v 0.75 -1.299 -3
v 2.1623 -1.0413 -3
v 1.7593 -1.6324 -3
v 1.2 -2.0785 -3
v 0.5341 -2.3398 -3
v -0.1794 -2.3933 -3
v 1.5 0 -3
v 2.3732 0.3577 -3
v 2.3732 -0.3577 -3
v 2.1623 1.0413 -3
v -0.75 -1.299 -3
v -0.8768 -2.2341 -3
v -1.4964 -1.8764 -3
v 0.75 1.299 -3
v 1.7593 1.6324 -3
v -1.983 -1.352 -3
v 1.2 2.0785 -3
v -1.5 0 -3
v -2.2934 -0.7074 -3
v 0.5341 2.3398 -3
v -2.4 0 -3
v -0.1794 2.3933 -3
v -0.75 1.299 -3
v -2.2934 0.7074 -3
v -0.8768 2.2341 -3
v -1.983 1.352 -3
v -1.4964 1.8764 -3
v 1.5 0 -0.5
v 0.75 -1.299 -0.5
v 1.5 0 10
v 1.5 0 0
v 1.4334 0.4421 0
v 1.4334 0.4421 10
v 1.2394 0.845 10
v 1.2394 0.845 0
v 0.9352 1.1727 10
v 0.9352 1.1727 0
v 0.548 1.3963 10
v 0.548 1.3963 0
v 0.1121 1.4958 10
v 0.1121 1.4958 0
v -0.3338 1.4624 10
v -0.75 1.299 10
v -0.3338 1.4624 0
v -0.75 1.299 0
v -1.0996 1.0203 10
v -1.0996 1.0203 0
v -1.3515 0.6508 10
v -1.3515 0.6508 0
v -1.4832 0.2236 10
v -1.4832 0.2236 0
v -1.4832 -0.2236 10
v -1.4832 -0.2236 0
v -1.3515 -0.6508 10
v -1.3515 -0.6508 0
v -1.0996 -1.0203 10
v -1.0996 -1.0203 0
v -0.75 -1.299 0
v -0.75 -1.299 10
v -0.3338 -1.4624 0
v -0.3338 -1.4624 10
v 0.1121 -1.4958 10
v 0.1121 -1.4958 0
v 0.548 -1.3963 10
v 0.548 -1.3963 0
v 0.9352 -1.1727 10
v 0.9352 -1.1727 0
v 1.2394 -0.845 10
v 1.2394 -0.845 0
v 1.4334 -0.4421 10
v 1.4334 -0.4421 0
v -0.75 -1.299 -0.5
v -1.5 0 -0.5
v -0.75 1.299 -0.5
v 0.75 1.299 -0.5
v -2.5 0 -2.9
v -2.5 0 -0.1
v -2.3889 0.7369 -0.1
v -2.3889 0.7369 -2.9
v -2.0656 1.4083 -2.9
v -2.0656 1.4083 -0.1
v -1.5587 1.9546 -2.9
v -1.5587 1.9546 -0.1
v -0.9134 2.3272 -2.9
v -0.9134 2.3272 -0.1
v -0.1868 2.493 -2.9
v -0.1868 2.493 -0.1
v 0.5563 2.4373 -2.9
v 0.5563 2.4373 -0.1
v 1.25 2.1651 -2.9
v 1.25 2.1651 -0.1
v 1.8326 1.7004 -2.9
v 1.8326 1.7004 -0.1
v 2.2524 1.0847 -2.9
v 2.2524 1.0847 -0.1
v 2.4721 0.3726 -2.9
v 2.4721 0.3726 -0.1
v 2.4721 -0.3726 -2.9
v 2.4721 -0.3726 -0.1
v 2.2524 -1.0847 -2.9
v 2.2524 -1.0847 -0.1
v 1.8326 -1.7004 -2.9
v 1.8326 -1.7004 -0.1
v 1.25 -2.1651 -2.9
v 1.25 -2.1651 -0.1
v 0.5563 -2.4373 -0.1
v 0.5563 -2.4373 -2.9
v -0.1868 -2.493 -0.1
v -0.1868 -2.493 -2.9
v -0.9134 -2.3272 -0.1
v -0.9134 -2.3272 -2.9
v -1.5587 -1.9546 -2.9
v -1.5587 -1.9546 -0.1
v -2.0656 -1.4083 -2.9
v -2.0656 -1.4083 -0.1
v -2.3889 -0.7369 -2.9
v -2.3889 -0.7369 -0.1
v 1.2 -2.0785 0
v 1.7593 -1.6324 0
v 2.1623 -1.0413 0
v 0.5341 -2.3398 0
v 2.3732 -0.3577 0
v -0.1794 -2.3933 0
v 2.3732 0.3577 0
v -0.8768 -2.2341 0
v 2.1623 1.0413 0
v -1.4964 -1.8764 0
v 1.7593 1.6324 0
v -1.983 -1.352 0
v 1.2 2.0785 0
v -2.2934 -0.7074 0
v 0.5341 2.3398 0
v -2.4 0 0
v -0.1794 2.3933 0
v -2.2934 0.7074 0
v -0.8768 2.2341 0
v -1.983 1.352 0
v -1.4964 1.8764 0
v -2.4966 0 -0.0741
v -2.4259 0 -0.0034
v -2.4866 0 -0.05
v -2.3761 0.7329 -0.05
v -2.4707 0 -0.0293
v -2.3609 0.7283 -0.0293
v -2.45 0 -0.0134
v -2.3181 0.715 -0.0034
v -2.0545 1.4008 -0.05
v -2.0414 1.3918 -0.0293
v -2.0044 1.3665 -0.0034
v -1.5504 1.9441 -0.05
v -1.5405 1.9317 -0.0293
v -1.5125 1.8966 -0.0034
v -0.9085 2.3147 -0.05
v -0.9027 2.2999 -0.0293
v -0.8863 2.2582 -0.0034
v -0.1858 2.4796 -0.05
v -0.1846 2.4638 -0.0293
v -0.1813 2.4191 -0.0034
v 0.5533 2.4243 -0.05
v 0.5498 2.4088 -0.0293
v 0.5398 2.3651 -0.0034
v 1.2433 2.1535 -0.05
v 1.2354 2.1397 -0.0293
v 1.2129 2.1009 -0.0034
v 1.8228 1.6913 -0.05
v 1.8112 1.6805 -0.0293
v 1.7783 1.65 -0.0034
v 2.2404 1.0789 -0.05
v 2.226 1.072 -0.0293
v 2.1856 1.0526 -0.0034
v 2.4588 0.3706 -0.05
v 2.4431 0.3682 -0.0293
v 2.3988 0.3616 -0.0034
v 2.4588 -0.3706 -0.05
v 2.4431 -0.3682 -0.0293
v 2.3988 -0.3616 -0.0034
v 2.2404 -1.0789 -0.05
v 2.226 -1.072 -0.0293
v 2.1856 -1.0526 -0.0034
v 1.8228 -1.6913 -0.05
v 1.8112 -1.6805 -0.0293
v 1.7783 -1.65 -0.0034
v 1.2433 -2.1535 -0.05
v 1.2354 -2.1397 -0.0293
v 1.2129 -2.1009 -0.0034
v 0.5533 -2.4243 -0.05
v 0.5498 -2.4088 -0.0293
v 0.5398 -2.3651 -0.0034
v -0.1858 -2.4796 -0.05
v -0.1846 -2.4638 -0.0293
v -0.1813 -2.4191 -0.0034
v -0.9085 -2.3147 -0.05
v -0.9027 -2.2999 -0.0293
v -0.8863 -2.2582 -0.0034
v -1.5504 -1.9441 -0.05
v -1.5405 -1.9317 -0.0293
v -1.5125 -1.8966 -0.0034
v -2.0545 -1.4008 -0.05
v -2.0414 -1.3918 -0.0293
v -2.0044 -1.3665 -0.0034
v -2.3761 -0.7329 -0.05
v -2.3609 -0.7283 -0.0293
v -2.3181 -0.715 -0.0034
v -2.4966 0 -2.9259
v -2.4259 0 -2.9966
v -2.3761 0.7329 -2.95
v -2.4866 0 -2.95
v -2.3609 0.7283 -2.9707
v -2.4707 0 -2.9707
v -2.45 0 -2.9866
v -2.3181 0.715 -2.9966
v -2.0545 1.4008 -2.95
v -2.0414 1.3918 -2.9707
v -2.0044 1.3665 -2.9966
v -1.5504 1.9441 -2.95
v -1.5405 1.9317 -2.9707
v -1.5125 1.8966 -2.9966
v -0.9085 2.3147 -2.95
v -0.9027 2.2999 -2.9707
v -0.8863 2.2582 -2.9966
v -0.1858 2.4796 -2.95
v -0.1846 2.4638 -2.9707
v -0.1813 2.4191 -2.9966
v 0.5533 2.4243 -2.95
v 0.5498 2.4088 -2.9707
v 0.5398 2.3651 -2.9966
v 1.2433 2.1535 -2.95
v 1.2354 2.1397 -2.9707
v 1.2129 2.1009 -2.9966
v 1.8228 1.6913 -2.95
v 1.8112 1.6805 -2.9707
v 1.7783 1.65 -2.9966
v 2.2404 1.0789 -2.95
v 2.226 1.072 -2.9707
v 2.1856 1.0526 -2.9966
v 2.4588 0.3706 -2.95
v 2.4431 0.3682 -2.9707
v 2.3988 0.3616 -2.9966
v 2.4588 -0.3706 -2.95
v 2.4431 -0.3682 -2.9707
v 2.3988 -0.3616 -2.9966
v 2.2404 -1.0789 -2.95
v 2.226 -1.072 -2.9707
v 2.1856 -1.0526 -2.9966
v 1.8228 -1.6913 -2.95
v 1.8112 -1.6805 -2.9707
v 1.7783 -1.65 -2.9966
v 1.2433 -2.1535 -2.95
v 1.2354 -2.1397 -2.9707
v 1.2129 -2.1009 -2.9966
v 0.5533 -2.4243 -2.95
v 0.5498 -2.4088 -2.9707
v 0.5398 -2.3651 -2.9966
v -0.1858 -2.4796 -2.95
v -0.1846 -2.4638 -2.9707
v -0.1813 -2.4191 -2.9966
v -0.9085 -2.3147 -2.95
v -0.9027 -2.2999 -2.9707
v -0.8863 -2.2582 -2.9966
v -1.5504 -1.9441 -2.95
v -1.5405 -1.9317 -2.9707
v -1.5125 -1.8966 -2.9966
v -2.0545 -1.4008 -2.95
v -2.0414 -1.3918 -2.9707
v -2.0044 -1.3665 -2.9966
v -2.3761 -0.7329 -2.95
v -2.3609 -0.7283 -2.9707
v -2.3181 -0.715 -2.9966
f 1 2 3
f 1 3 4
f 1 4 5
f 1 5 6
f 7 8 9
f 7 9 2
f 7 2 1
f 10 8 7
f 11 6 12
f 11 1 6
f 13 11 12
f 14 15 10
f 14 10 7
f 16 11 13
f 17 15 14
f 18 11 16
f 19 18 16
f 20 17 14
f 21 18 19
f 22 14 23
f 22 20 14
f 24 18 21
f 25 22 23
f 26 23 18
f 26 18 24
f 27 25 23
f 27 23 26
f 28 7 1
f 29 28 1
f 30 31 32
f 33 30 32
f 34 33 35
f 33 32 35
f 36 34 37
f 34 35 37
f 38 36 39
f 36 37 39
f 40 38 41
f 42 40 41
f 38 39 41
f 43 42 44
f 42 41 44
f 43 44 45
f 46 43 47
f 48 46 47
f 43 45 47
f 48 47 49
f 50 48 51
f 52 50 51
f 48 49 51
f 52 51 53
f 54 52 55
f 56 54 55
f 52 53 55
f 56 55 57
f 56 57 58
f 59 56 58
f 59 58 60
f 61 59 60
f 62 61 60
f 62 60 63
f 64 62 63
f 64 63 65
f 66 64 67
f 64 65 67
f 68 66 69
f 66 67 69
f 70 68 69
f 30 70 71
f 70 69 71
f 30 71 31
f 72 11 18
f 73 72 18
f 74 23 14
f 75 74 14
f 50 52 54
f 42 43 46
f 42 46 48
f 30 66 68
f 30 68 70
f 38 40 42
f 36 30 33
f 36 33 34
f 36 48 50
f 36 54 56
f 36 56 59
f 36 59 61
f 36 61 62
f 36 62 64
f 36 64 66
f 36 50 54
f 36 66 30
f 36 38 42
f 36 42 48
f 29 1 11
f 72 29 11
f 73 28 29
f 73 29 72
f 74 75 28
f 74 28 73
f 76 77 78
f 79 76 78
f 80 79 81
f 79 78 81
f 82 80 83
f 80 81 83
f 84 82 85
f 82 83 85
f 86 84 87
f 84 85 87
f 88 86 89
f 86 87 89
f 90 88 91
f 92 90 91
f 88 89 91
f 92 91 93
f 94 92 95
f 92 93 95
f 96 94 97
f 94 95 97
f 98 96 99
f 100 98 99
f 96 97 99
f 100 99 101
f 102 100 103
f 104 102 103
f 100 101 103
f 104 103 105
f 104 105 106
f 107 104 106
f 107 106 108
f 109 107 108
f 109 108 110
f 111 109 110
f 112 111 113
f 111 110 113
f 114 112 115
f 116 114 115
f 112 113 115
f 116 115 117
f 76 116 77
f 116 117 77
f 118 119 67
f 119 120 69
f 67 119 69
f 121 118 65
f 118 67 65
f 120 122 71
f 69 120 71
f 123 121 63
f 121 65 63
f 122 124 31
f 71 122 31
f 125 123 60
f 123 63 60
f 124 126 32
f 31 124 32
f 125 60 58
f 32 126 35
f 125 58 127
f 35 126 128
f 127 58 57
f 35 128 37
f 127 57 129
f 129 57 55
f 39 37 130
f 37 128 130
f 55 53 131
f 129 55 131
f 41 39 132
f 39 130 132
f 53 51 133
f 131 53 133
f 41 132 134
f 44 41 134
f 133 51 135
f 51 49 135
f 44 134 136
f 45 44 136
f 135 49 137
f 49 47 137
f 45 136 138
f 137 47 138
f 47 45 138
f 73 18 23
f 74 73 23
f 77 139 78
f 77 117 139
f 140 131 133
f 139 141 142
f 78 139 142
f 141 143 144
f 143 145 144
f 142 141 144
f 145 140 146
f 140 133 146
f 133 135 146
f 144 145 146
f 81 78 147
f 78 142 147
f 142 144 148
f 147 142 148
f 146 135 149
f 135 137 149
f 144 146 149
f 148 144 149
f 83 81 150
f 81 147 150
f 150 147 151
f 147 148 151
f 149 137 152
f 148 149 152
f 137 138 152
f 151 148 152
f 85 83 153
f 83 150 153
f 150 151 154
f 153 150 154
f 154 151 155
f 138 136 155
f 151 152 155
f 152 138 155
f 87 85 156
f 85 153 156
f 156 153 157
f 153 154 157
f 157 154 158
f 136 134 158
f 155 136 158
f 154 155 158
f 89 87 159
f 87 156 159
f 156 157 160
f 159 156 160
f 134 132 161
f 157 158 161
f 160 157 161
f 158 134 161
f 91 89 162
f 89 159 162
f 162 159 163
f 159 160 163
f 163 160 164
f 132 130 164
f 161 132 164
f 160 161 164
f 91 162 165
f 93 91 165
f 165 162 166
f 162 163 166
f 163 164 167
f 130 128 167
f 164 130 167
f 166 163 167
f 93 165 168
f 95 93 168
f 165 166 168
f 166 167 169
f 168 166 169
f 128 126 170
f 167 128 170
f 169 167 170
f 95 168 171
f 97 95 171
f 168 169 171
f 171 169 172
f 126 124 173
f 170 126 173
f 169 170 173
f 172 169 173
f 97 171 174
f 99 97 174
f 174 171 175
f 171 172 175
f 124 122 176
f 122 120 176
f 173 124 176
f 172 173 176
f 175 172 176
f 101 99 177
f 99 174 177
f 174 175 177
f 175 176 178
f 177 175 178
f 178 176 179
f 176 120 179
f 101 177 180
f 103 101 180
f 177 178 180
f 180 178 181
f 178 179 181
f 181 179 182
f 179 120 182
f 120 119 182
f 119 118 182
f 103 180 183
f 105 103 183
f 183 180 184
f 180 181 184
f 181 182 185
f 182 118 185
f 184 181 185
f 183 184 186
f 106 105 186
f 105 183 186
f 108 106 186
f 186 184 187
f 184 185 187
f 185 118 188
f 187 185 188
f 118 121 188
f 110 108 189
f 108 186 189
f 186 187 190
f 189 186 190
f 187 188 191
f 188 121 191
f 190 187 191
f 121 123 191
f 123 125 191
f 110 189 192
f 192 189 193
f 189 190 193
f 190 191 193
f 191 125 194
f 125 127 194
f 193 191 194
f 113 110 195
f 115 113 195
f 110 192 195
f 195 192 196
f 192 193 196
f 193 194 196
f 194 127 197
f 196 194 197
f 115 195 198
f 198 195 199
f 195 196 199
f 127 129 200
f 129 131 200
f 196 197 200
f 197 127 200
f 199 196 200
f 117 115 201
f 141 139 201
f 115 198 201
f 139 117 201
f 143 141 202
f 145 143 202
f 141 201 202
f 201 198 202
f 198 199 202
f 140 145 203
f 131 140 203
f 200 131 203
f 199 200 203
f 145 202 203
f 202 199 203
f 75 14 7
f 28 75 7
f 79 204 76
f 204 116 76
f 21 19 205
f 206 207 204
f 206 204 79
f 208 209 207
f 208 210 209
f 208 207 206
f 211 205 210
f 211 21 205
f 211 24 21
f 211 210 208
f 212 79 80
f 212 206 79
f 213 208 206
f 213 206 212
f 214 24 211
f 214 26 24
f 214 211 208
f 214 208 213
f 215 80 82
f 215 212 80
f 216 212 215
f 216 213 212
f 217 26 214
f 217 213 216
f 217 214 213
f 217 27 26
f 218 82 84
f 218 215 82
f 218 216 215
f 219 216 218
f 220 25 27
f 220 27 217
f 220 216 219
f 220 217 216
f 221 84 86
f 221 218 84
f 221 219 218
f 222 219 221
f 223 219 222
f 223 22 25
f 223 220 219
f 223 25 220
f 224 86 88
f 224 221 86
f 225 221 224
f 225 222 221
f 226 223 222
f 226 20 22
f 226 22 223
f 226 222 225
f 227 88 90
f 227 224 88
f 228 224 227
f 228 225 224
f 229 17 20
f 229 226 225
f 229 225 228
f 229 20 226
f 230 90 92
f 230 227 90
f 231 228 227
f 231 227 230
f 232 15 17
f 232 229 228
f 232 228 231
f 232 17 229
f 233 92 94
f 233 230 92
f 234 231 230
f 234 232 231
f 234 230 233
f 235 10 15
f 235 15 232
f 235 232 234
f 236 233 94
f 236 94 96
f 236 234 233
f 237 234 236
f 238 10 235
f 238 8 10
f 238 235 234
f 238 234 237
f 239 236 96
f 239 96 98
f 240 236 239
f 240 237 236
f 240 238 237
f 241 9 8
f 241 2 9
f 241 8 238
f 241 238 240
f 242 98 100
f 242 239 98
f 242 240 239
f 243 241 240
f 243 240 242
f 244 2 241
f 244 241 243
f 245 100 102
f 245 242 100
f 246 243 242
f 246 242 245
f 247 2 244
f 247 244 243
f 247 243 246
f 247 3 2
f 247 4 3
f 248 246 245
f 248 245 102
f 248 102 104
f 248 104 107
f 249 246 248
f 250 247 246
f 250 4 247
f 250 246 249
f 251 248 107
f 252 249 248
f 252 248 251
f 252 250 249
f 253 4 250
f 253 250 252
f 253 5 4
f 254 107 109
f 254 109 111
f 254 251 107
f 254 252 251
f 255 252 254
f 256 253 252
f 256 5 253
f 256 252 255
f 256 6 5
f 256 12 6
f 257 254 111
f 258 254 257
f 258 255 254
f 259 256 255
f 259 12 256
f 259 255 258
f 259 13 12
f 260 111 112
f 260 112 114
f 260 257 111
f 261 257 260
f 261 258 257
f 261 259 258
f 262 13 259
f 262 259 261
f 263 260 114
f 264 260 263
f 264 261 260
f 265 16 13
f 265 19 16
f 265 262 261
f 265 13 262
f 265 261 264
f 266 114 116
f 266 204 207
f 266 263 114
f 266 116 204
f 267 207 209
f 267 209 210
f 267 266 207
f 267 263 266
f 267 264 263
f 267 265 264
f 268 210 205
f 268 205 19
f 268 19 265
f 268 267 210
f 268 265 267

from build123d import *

# Parameters (mm, degrees)
CROQUIS1_R              = 1.5
SALIENTE_EXTRUIR1_DEPTH = 10
CROQUIS3_R              = 2.5
SALIENTE_EXTRUIR3_DEPTH = 3
CORTAR_EXTRUIR1_DEPTH   = 2.5
REDONDEO4_R             = 0.1
REDONDEO5_R             = 0.1


with BuildPart() as part:
    # Croquis1 → Saliente-Extruir1 (new body)
    with BuildSketch(Plane.XY):
        Circle(CROQUIS1_R)
    extrude(amount=SALIENTE_EXTRUIR1_DEPTH)

    # Croquis3 → Saliente-Extruir3 (add)
    with BuildSketch(Plane(origin=(0, 0, 0), x_dir=(-1, 0, 0), z_dir=(0, 0, -1))):
        Circle(CROQUIS3_R)
    extrude(amount=SALIENTE_EXTRUIR3_DEPTH)

    # Croquis4 → Cortar-Extruir1 (cut)
    with BuildSketch(Plane(origin=(0, 0, -3), x_dir=(-1, 0, 0), z_dir=(0, 0, -1))):
        Polygon((1.5, 0), (0.75, 1.299038106), (-0.75, 1.299038106), (-1.5, 0), (-0.75, -1.299038106), (0.75, -1.299038106), align=None)
    extrude(amount=-CORTAR_EXTRUIR1_DEPTH, mode=Mode.SUBTRACT)

    # Redondeo4
    redondeo4_edges = [part.edges().sort_by_distance(p)[0] for p in [
        (2.5, 0, -3),
    ]]
    fillet(redondeo4_edges, radius=REDONDEO4_R)

    # Redondeo5
    redondeo5_edges = [part.edges().sort_by_distance(p)[0] for p in [
        (2.5, 0, 0),
    ]]
    fillet(redondeo5_edges, radius=REDONDEO5_R)


solid = part.part
